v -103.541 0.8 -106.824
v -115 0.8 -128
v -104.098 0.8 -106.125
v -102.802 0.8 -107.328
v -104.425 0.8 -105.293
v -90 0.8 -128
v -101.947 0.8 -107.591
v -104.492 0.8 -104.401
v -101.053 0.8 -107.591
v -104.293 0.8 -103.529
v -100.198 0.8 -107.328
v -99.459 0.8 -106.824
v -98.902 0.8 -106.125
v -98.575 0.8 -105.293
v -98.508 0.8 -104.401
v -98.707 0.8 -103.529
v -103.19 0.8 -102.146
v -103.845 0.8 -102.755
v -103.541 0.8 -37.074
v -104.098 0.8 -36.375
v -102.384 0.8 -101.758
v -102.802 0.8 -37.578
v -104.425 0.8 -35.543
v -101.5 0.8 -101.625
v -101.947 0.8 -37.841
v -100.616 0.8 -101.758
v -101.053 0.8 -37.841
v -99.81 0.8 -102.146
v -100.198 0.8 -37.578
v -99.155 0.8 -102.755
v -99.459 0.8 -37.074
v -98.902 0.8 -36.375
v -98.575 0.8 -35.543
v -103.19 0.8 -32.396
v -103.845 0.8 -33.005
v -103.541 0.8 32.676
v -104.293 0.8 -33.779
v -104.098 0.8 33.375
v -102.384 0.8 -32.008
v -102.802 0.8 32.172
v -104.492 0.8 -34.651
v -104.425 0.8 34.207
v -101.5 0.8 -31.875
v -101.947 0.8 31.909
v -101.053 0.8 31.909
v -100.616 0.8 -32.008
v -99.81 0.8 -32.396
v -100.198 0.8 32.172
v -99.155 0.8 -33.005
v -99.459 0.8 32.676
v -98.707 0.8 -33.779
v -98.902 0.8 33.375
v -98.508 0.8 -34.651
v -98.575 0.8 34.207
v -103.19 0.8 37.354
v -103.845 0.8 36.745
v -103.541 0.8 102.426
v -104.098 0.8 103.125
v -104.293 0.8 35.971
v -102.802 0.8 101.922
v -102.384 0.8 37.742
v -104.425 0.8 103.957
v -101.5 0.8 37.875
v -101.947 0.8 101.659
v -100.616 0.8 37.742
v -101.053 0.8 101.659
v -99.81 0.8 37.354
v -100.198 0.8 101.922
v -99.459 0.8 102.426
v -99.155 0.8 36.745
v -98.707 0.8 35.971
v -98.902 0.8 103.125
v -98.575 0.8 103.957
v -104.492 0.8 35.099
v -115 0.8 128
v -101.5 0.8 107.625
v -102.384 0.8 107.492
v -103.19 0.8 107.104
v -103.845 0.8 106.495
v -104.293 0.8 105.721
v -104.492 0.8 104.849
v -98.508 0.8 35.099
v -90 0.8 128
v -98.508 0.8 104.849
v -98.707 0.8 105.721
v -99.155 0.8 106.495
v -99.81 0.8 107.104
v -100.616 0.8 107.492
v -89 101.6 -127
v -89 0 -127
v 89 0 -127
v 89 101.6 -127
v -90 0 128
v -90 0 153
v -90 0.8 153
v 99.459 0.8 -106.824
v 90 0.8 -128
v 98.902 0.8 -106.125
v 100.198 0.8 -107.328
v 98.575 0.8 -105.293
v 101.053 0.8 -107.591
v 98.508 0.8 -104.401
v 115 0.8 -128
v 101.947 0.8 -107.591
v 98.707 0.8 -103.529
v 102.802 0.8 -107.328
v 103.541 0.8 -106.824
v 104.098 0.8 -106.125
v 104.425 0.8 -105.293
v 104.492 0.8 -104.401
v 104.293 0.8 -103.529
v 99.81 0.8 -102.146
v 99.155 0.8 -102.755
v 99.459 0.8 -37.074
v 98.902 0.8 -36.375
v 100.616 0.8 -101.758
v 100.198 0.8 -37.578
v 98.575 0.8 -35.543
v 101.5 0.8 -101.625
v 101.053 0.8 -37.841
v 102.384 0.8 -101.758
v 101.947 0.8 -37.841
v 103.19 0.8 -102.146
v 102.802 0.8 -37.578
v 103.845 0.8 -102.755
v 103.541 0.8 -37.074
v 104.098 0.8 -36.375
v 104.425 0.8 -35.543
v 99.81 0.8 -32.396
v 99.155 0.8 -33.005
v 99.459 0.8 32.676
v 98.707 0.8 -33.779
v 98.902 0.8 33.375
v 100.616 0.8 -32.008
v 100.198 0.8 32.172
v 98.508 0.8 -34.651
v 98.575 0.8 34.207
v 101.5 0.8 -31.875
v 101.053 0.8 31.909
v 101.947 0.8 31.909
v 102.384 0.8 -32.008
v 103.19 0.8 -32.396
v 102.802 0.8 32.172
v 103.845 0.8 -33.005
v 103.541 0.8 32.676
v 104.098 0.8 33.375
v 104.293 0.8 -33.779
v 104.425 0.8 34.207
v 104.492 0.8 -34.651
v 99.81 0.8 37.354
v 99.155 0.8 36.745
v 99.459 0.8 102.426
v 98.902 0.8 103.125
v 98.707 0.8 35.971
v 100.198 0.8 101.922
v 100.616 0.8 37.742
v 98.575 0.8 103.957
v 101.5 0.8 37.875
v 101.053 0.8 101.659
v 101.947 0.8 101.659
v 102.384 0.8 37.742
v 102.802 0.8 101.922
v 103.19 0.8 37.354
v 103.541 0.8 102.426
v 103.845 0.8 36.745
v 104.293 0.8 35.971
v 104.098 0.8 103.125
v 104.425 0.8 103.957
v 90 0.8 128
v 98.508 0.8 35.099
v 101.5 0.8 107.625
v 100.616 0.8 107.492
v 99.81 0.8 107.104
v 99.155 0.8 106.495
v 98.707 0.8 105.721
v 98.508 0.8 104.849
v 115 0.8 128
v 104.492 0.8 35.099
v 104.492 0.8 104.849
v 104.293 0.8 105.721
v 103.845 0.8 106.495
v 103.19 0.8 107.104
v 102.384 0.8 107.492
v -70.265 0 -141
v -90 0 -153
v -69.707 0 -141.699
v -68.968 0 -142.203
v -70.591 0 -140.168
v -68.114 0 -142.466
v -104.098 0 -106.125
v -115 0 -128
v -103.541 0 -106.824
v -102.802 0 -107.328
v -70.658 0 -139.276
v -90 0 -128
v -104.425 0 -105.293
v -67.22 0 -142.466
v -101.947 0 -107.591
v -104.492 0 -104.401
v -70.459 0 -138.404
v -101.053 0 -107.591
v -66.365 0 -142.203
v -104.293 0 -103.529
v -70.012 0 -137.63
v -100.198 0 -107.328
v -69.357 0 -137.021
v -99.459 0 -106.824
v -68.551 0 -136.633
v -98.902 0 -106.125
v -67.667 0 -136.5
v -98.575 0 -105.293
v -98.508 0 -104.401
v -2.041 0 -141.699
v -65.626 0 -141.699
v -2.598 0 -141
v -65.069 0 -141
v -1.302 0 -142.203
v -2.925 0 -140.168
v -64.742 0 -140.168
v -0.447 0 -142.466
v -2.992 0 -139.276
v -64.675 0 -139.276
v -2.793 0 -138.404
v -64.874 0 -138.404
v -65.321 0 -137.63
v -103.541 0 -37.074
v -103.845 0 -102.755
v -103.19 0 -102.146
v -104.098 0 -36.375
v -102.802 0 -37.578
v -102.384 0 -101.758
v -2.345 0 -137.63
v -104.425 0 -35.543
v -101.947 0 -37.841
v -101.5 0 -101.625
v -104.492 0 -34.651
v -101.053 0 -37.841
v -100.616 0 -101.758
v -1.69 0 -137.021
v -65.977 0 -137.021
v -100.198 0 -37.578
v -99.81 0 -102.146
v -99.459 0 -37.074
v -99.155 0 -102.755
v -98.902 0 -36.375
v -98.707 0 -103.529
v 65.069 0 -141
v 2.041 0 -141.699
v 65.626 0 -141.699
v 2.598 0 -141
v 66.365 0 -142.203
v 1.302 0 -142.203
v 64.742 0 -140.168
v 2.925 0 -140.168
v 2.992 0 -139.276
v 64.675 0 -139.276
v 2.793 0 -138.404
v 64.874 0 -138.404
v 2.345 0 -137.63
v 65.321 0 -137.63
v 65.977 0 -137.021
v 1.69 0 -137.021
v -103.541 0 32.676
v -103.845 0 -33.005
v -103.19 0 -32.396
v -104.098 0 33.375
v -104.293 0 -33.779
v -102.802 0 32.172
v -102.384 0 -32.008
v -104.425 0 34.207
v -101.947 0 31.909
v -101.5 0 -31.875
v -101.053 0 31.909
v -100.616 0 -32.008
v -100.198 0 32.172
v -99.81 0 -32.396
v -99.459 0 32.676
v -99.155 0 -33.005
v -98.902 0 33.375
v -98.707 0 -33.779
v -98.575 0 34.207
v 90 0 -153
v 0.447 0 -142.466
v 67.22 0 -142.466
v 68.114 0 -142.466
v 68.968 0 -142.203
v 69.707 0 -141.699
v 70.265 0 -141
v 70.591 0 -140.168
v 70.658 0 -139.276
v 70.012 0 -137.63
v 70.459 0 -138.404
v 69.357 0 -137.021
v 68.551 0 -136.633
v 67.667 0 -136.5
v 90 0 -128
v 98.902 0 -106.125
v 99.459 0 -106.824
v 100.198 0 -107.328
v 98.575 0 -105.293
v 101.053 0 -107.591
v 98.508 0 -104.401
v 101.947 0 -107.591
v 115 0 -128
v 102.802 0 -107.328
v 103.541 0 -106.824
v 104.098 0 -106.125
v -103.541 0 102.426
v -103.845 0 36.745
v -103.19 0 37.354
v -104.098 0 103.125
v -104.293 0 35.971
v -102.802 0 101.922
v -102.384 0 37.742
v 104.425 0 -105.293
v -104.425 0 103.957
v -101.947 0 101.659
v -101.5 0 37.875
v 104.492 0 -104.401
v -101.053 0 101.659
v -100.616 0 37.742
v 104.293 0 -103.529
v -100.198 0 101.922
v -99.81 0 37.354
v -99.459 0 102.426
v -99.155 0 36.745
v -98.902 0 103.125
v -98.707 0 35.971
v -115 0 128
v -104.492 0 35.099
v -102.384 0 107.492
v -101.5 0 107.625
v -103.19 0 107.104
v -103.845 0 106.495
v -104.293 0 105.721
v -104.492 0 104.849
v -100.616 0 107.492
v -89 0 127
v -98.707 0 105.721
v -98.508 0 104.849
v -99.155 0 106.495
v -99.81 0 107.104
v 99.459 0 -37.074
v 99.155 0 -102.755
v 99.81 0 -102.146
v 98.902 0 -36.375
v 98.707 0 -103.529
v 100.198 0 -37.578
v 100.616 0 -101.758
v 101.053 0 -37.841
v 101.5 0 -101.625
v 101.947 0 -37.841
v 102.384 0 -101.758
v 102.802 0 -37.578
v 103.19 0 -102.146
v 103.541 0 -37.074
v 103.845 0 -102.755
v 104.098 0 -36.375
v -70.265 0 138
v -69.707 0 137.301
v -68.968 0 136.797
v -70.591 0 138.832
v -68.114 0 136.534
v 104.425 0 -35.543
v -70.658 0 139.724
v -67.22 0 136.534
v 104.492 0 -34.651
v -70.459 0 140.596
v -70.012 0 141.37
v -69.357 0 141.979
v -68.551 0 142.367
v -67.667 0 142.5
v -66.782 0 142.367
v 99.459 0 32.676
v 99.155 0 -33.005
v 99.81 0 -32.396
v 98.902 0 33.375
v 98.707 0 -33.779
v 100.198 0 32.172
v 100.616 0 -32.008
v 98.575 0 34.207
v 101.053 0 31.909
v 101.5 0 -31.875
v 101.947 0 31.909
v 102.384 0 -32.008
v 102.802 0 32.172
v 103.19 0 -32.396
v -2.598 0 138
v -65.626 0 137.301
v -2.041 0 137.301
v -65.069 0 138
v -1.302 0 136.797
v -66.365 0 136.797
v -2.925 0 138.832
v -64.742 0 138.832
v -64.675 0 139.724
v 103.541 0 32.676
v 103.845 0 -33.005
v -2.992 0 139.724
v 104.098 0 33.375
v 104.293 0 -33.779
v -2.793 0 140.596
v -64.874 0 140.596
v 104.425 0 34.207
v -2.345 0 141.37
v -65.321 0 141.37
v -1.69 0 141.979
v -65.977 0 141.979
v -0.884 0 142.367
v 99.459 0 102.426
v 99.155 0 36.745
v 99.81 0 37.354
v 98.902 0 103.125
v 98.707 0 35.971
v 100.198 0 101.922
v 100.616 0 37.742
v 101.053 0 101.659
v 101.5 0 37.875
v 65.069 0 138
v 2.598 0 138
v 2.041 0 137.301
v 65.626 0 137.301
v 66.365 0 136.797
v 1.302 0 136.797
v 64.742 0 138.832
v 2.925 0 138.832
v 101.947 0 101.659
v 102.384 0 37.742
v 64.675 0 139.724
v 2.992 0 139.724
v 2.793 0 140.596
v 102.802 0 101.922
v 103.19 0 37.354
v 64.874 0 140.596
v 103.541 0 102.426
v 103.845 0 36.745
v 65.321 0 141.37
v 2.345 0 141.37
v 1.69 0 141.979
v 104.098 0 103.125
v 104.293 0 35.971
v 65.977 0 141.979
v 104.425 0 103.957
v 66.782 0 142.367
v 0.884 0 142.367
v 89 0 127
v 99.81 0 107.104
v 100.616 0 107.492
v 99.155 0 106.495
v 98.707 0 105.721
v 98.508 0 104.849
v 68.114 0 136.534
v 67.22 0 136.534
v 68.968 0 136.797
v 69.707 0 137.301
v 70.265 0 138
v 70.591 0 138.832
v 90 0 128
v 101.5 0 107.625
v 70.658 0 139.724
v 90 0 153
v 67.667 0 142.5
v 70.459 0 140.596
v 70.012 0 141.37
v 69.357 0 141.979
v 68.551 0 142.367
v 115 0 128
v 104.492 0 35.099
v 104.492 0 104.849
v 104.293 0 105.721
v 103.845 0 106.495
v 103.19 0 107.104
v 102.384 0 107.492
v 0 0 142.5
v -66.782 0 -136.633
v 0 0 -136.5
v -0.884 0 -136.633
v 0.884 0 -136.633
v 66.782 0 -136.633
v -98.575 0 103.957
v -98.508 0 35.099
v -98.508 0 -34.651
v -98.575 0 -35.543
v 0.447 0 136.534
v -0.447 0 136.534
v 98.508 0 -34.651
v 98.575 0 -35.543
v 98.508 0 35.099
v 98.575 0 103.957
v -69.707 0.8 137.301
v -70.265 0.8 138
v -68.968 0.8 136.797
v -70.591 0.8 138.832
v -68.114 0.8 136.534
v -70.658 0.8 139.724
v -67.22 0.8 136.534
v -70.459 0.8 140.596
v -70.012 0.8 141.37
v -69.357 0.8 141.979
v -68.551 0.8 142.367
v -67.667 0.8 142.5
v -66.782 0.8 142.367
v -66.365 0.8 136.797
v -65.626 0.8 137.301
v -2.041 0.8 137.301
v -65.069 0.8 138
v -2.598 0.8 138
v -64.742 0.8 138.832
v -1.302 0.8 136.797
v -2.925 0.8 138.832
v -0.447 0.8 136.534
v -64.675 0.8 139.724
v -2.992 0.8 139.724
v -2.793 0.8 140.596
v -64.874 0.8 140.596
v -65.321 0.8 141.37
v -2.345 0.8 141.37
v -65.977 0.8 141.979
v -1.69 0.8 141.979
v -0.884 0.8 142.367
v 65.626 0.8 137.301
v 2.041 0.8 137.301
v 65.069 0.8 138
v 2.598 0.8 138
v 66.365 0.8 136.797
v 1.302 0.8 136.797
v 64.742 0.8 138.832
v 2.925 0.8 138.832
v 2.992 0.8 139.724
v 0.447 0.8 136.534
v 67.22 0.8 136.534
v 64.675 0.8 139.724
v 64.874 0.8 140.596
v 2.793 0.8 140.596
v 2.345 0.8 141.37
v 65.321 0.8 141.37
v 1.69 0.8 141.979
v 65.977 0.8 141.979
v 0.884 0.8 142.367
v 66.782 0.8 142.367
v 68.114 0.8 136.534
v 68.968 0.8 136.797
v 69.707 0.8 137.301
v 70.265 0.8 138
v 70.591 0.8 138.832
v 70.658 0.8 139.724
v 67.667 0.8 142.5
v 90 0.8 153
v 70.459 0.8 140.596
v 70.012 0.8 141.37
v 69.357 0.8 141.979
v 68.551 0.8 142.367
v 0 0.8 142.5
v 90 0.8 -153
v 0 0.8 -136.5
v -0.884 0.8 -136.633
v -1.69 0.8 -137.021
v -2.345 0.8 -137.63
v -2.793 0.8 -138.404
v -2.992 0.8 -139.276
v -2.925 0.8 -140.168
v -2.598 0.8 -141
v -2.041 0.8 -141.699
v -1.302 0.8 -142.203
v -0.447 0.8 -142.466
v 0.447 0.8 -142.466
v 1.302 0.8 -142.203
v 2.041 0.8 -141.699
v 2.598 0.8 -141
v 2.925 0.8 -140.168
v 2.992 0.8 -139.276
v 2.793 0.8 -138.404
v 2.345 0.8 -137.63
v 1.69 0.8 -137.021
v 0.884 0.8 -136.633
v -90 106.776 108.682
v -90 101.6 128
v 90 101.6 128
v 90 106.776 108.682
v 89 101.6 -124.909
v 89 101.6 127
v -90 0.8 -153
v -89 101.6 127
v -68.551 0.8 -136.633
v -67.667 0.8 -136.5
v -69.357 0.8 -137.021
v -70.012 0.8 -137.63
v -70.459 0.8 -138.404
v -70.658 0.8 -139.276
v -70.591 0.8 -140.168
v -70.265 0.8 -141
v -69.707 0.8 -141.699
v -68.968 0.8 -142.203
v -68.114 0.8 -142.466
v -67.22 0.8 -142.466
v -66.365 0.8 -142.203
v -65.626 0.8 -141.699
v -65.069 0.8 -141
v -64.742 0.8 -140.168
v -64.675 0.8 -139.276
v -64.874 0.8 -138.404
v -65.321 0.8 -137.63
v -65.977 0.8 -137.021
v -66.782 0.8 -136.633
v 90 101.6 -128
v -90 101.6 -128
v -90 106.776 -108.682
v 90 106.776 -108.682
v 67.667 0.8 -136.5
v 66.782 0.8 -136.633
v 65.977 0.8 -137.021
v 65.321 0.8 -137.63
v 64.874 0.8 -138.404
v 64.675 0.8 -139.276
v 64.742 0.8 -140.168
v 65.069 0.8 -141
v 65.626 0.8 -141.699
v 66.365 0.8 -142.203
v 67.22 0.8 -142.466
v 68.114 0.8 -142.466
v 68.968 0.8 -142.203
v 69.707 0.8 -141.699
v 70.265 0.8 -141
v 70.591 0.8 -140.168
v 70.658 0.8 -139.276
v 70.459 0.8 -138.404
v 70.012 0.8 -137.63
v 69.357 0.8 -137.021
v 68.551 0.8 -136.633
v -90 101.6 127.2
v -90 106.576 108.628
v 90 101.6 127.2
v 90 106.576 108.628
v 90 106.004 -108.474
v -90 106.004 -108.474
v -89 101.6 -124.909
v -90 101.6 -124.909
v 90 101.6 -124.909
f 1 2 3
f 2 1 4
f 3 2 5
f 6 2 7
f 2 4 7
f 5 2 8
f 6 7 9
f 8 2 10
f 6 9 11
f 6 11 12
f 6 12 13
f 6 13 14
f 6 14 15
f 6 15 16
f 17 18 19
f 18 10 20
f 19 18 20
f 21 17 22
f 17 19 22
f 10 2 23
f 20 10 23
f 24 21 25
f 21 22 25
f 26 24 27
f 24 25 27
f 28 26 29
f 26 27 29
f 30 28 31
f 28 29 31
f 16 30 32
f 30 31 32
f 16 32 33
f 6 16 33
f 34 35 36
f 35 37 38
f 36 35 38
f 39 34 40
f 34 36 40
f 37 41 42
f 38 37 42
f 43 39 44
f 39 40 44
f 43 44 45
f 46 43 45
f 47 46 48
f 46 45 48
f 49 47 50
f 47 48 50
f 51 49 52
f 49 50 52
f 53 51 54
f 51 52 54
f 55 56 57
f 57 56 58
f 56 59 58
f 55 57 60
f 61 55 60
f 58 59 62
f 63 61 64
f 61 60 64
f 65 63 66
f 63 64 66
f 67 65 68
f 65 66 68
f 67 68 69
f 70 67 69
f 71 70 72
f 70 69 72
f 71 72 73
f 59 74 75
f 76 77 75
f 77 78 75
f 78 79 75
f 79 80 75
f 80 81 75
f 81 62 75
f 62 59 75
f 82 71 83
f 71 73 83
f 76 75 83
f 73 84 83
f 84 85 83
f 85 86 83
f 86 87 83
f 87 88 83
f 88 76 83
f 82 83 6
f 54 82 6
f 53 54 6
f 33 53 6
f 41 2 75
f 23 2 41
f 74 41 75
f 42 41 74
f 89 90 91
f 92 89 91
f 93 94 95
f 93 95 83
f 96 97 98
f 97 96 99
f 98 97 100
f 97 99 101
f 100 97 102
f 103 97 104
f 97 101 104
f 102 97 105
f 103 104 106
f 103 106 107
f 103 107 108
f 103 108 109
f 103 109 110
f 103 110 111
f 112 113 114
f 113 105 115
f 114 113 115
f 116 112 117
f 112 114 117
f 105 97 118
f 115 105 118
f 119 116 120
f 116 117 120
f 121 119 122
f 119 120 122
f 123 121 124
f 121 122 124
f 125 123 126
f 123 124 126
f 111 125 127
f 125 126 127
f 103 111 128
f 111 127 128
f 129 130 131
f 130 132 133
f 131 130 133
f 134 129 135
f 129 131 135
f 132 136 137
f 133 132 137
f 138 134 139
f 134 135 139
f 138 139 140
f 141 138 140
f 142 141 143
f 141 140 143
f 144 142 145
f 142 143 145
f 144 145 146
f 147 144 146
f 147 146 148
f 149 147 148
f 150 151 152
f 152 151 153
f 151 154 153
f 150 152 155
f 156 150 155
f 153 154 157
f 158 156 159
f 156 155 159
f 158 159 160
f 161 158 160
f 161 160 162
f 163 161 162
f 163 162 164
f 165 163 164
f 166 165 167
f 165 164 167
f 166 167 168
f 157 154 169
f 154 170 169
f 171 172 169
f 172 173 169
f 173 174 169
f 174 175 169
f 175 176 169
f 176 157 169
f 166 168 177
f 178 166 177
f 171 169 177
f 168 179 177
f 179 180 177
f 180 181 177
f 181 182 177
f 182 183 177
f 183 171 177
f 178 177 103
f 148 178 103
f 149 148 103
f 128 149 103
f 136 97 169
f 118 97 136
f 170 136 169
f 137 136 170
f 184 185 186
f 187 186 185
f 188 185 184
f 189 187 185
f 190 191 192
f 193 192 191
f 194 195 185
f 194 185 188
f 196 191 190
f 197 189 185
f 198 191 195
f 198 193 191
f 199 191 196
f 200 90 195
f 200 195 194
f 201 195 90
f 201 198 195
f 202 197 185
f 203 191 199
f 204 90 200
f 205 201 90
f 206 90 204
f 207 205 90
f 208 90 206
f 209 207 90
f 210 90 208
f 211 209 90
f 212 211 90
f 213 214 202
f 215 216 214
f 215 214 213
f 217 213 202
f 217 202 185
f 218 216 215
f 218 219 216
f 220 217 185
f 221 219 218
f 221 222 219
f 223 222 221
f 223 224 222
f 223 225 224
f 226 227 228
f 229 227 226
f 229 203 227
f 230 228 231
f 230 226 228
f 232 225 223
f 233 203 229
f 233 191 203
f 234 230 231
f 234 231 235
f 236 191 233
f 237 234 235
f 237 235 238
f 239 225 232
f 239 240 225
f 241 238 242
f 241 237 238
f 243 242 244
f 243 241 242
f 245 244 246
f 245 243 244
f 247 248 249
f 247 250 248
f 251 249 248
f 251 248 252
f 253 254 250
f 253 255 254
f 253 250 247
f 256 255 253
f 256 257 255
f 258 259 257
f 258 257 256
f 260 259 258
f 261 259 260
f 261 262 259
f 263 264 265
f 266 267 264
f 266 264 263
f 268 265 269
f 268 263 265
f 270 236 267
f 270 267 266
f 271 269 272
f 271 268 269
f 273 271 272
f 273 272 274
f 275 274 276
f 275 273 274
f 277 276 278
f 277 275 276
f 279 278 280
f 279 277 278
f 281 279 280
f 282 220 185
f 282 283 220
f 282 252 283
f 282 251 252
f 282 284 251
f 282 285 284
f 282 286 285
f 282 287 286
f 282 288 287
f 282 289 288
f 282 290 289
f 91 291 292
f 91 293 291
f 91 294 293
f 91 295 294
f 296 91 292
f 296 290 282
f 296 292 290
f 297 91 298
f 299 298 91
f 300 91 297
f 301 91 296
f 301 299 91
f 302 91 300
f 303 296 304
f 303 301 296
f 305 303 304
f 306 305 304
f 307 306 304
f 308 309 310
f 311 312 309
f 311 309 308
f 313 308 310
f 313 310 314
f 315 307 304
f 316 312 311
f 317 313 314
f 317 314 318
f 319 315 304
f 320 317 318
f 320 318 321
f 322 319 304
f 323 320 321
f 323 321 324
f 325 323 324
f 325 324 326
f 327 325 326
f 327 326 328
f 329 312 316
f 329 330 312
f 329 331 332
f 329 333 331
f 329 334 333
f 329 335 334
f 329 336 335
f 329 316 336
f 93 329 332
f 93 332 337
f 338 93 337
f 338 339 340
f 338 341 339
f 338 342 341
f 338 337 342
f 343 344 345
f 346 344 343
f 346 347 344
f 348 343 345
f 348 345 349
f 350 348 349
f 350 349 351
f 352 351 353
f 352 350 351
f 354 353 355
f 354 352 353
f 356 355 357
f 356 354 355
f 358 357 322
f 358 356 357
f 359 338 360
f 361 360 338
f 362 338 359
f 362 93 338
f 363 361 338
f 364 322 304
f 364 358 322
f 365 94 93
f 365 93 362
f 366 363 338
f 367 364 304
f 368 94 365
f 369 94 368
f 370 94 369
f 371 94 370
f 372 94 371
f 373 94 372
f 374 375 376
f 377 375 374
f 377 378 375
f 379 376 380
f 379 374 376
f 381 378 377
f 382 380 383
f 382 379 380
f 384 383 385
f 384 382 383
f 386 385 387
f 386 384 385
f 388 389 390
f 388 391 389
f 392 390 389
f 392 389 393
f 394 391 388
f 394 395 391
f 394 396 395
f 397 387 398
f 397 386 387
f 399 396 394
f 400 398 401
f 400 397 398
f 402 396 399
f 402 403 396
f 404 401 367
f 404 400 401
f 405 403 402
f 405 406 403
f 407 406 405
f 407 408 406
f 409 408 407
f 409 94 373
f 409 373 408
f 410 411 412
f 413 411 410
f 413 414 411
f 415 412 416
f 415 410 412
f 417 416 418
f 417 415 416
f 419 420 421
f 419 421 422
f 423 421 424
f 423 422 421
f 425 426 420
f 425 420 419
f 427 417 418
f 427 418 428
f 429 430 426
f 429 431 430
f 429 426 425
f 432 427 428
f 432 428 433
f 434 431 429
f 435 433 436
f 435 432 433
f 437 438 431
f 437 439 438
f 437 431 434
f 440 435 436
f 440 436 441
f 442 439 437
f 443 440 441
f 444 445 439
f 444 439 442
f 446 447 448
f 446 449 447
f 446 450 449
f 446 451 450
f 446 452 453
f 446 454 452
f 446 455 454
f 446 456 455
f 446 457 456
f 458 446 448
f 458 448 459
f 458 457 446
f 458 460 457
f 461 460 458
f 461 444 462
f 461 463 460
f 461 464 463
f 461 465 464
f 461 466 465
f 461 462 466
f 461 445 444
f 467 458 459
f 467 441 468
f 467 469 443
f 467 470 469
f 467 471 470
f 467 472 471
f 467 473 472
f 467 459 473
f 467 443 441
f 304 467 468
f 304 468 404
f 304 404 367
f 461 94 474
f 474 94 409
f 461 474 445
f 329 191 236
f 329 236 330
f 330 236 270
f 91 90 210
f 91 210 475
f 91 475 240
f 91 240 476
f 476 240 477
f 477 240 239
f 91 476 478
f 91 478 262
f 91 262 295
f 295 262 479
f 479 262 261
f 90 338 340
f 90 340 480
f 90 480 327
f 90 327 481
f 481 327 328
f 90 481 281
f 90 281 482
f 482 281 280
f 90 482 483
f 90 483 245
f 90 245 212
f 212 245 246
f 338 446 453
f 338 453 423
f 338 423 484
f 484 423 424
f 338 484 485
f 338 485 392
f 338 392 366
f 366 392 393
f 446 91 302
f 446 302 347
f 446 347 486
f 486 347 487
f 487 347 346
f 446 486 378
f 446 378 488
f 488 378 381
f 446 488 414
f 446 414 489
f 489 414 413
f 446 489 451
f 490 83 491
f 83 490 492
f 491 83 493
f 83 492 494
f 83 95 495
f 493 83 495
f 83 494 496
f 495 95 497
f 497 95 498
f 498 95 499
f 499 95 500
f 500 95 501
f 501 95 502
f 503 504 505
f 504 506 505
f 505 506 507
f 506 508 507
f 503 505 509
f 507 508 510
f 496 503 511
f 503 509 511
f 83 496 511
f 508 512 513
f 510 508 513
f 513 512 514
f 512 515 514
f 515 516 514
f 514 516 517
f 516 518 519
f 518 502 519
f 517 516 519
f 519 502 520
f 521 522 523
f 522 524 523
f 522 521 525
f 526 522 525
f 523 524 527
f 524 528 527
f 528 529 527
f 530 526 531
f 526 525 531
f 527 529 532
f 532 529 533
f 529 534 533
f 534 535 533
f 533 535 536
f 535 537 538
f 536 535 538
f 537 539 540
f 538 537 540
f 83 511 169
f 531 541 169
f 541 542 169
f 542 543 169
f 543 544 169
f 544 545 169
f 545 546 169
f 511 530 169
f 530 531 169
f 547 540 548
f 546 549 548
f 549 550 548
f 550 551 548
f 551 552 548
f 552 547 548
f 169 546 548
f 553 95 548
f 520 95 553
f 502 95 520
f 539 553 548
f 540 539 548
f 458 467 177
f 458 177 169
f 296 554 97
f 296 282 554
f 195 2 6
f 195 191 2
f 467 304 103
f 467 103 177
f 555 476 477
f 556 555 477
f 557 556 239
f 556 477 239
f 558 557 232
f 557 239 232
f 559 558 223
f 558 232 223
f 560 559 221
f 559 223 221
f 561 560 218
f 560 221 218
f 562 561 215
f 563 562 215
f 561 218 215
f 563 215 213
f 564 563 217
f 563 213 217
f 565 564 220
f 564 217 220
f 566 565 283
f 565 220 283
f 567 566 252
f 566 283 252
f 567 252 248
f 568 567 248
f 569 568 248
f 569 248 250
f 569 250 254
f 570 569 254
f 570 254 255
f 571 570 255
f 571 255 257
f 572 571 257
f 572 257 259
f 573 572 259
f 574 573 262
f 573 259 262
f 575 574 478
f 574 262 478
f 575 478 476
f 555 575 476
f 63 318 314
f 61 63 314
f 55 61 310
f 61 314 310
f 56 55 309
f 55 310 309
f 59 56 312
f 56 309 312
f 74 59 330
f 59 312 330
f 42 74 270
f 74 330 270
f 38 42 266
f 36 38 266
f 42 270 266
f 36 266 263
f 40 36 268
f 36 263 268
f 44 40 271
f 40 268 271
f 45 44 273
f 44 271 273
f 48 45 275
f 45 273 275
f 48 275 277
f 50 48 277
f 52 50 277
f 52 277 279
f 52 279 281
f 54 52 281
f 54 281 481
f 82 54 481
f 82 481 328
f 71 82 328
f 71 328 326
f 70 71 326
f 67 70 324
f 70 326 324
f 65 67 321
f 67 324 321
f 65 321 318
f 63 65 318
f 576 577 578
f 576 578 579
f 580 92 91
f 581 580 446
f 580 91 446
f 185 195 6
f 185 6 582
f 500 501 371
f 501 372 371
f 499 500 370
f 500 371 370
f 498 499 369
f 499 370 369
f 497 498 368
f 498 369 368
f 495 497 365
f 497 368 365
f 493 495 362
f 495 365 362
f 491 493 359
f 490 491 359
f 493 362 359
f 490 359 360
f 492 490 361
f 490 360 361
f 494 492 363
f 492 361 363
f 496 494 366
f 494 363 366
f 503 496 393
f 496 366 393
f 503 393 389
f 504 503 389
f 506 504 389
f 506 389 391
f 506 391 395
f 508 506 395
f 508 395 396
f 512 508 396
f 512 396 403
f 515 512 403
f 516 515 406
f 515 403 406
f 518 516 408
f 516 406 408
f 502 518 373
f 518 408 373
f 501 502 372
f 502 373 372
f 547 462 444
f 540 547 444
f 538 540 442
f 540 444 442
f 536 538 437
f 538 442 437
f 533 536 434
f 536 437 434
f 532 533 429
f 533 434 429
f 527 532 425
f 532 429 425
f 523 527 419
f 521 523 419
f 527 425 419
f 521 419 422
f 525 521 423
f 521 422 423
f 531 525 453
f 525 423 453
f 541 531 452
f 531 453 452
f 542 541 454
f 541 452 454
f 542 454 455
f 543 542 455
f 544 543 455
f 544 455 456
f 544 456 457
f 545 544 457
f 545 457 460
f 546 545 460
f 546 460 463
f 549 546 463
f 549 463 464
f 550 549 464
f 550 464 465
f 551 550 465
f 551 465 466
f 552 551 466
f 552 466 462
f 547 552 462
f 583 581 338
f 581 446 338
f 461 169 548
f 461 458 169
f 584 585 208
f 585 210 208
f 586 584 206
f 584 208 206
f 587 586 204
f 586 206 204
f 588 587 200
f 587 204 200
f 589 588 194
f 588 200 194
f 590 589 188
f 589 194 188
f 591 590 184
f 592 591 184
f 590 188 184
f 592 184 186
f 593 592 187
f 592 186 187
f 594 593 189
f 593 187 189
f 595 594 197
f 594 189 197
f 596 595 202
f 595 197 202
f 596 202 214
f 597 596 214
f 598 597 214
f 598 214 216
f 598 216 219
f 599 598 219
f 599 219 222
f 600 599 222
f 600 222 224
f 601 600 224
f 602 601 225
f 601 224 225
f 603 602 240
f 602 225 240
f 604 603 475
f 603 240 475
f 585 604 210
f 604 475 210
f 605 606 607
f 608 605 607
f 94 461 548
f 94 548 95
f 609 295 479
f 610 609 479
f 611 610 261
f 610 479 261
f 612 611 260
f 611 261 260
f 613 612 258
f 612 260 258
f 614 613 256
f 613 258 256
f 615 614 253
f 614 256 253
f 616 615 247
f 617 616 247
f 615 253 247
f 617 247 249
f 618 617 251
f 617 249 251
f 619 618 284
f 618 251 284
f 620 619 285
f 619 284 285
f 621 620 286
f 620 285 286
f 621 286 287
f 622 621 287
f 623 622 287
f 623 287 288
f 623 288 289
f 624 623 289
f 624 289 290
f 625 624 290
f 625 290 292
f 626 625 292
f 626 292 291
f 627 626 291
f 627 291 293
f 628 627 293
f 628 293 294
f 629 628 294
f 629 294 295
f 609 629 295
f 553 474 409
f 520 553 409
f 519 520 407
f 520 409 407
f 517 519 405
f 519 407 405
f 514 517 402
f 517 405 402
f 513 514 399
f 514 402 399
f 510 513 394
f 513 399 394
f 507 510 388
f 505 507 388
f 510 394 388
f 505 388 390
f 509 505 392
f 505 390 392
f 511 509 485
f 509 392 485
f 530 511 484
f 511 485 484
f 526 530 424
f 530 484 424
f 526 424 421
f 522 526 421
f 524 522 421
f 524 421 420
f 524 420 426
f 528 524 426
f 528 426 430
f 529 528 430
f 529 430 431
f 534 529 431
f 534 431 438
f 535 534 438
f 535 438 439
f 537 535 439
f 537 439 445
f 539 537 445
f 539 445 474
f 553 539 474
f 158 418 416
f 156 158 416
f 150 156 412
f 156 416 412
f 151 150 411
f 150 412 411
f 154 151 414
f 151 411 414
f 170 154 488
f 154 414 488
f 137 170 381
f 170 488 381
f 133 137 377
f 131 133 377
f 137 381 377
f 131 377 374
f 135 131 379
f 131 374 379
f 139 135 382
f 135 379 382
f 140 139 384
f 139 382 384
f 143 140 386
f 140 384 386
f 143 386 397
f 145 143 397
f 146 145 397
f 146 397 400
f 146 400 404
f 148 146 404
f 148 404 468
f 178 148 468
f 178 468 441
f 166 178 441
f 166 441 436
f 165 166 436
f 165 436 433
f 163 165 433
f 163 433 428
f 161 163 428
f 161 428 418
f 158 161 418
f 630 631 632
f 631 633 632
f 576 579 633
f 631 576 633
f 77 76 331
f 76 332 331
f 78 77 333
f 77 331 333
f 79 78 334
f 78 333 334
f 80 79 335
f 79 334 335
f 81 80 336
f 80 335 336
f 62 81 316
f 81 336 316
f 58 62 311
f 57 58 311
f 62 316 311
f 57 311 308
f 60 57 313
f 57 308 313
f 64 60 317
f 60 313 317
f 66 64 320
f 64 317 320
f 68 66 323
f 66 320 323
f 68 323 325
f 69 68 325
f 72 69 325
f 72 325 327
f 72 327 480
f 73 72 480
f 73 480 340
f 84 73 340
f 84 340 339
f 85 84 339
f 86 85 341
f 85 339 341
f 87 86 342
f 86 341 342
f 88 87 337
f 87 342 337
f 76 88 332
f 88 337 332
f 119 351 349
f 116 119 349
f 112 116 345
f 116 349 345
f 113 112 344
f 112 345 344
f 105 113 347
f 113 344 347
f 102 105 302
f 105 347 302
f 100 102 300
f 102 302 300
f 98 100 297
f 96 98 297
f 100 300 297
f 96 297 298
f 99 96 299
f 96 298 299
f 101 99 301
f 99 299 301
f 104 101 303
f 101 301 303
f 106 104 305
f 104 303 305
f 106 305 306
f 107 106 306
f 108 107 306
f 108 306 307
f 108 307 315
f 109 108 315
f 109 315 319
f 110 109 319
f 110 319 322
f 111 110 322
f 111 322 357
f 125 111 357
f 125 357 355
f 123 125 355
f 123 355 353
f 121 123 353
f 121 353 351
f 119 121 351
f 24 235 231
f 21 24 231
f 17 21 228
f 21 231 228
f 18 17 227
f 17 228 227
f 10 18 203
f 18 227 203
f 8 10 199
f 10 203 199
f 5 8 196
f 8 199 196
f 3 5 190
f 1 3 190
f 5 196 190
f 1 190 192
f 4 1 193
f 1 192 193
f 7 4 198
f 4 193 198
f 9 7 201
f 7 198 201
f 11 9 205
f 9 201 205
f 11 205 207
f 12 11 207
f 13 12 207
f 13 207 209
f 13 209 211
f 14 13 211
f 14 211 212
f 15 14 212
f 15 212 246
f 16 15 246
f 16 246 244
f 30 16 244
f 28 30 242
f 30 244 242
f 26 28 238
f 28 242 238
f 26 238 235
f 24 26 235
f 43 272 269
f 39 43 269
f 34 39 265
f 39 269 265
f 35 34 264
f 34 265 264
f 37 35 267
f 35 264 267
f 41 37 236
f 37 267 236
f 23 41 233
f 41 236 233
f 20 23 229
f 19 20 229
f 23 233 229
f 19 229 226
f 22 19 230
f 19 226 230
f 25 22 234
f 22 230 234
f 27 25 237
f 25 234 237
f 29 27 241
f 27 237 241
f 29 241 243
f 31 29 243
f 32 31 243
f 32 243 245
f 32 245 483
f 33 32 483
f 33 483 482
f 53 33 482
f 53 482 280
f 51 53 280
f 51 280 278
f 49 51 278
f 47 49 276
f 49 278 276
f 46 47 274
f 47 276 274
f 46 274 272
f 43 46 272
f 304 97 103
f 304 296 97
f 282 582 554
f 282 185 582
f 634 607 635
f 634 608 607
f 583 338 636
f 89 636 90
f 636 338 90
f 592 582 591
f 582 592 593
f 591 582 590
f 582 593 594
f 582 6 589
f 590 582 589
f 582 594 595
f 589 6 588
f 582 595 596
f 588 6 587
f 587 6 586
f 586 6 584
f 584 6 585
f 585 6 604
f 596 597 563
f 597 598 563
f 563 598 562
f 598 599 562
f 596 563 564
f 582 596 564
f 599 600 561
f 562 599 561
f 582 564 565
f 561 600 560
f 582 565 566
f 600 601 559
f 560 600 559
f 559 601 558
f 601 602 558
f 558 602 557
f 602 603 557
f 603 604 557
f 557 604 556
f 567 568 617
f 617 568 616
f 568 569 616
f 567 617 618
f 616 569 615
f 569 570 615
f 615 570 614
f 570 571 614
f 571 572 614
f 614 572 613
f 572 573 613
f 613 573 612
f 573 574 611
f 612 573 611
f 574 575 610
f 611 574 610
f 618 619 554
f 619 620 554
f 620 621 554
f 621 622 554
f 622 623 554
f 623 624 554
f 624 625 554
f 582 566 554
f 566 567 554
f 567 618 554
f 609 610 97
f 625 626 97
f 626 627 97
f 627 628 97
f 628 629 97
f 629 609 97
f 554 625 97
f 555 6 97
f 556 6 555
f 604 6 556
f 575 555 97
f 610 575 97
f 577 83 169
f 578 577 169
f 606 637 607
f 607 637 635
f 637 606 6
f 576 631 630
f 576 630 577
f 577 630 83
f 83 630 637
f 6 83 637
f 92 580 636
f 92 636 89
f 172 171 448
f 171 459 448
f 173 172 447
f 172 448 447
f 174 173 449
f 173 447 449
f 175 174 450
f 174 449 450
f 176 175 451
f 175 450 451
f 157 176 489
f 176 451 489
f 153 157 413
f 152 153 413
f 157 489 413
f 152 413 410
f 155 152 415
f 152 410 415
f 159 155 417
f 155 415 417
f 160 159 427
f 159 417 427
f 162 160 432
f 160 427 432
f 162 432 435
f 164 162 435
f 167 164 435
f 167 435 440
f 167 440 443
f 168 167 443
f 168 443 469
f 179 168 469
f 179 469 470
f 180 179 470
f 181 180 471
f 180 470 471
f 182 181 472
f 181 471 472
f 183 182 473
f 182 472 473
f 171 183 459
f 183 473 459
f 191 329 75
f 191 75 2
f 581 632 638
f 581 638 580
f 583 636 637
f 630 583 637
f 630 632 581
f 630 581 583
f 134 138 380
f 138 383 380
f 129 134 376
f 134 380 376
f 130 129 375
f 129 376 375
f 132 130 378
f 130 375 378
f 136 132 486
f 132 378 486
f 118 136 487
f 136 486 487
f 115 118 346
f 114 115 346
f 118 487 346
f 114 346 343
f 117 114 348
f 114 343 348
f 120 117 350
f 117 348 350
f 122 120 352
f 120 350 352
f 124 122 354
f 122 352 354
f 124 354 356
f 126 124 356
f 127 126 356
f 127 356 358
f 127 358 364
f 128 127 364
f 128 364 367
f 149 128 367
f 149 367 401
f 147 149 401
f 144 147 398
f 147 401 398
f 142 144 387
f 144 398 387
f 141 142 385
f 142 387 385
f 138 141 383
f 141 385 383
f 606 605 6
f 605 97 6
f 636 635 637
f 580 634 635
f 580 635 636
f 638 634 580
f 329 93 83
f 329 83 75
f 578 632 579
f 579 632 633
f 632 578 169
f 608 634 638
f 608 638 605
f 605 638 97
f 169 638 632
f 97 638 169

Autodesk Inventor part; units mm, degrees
ref_plane "YZ Plane" through (0, 0, 0) normal (1, 0, 0) x (0, 1, 0)
ref_plane "XZ Plane" through (0, 0, 0) normal (0, 1, 0) x (-1, 0, 0)
ref_plane "XY Plane" through (0, 0, 0) normal (0, 0, 1) x (1, 0, 0)
sketch "Sketch1" plane through (0, 0, 0) normal (0, 1, 0) x (-1, 0, 0)
  line L0 (-89, 127) -> (89, 127)
  line L1 (89, 127) -> (89, -127)
  line L2 (89, -127) -> (-89, -127)
  line L3 (-89, -127) -> (-89, 127)
  line L4 (-89, 127) -> (89, -127) construction
  line L5 (89, 127) -> (-89, -127) construction
  line L6 (90, 128) -> (-90, 128)
  line L7 (-90, 128) -> (-90, -128)
  line L8 (-90, -128) -> (90, -128)
  line L9 (90, -128) -> (90, 128)
  point P0 (0, 0)
  dimension "d0" = 178
  dimension "d1" = 254
  dimension "d2" = 1
extrude "Extrusion1" add sketch "Sketch1" along normal blind 101.6
sketch "Sketch3" plane through (0, 0, 0) normal (0, -1, 0) x (1, 0, 0)
  line L0 (90, 128) -> (90, -128) projected
  line L1 (90, -128) -> (-90, -128) projected
  line L2 (90, 128) -> (90, -128)
  line L3 (90, -128) -> (115, -128)
  line L4 (115, -128) -> (115, 128)
  line L5 (115, 128) -> (90, 128)
  line L6 (90, -128) -> (-90, -128)
  line L7 (-90, -128) -> (-90, -153)
  line L8 (-90, -153) -> (90, -153)
  line L9 (90, -153) -> (90, -128)
  line L10 (-90, 128) -> (90, 128) projected
  line L11 (-90, -128) -> (-90, 128)
  line L12 (-90, 128) -> (-115, 128)
  line L13 (-115, 128) -> (-115, -128)
  line L14 (-115, -128) -> (-90, -128)
  line L15 (-90, 128) -> (90, 128)
  line L16 (90, 128) -> (90, 153)
  line L17 (90, 153) -> (-90, 153)
  line L18 (-90, 153) -> (-90, 128)
  point P0 (0, 0)
  dimension "d11" = 25
  dimension "d12" = 25
  dimension "d13" = 25
  dimension "d14" = 25
extrude "Extrusion3" add sketch "Sketch3" against normal blind 0.8 contours L5 L4 L3 L0 | L10 L18 L17 L16 | L9 L8 L7 L1 | L11 L14 L13 L12
sketch "Sketch4" plane through (0, 0.8, 0) normal (0, 1, 0) x (1, 0, 0)
  line L0 (101.5, 139.5) -> (-101.5, 139.5) construction
  line L1 (-101.5, 139.5) -> (-101.5, -139.5) construction
  line L2 (-101.5, -139.5) -> (101.5, -139.5) construction
  line L3 (101.5, -139.5) -> (101.5, 139.5) construction
  line L4 (101.5, 139.5) -> (-101.5, -139.5) construction
  line L5 (-101.5, 139.5) -> (101.5, -139.5) construction
  line L6 (0, 0) -> (0, -60) construction
  line L7 (0, 0) -> (60, 0) construction
  point P0 (-101.5, 0)
  point P1 (101.5, 0)
  point P2 (101.5, 104.625)
  point P3 (101.5, 69.75)
  point P4 (101.5, 34.875)
  point P5 (101.5, 0)
  point P6 (101.5, -34.875)
  point P7 (101.5, -69.75)
  point P8 (101.5, -104.625)
  point P9 (67.6667, 139.5)
  point P10 (33.8333, 139.5)
  point P11 (0, 139.5)
  point P12 (-33.8333, 139.5)
  point P13 (-67.6667, 139.5)
  point P14 (-101.5, 139.5)
  point P15 (67.6667, -139.5)
  point P16 (33.8333, -139.5)
  point P17 (0, -139.5)
  point P18 (-33.8333, -139.5)
  point P19 (-67.6667, -139.5)
  point P20 (-101.5, -139.5)
  point P21 (-101.5, 104.625)
  point P22 (-101.5, 69.75)
  point P23 (-101.5, 34.875)
  point P24 (-101.5, 0)
  point P25 (-101.5, -34.875)
  point P26 (-101.5, -69.75)
  point P27 (-101.5, -104.625)
  dimension "d18" = 203
  dimension "d19" = 279
  dimension "d21" = 60
  dimension "d22" = 90
  dimension "d63" = 34.875
  dimension "d70" = 33.8333
  dimension "d77" = 33.8333
  dimension "d84" = 34.875
hole "Hole1" at (101.5, 0.8, -139.5) at (101.5, 0.8, -104.625) at (101.5, 0.8, -34.875) at (101.5, 0.8, 34.875) at (101.5, 0.8, 104.625) at (101.5, 0.8, 139.5) at (67.6667, 0.8, -139.5) at (0, 0.8, -139.5) at (-67.6667, 0.8, -139.5) at (-101.5, 0.8, -139.5) at (67.6667, 0.8, 139.5) at (0, 0.8, 139.5) at (-67.6667, 0.8, 139.5) at (-101.5, 0.8, 139.5) at (-101.5, 0.8, -104.625) at (-101.5, 0.8, -34.875) at (-101.5, 0.8, 34.875) at (-101.5, 0.8, 104.625) direction (0, -1, 0) diameter 6 end through all
sketch "Sketch9" plane through (90, 0.8, 128) normal (1, 0, 0) x (0, 0, -1)
  line L0 (0, 100.8) -> (19.3185, 105.9764)
  line L1 (0, 100.8) -> (20, 100.8) construction
  line L2 (19.3721, 105.7764) -> (0.8, 100.8)
  line L3 (19.3185, 105.9764) -> (19.3721, 105.7764)
  line L4 (256, 0) -> (256, 100.8) projected
  line L5 (256, 100.8) -> (236.6815, 105.9764)
  line L6 (256, 100.8) -> (276, 100.8) construction
  line L7 (0, 100.8) -> (256, 100.8) projected
  line L8 (229, 100.8) -> (256, 100.8)
  line L9 (256, 100.8) -> (0, 100.8) projected
  line L10 (0, 100.8) -> (0.8, 100.8)
  line L11 (236.4744, 105.2036) -> (252.909, 100.8)
  line L12 (236.6815, 105.9764) -> (236.4744, 105.2036)
  point P0 (128, -0.8)
  dimension "d51" = 20
  dimension "d52" = 15
  dimension "d53" = 20
  dimension "d54" = 165
  dimension "d89" = 0.8
extrude "Extrusion10" add sketch "Sketch9" against normal up to surface (180 mm away)
properties part number "chimneyHousing"
